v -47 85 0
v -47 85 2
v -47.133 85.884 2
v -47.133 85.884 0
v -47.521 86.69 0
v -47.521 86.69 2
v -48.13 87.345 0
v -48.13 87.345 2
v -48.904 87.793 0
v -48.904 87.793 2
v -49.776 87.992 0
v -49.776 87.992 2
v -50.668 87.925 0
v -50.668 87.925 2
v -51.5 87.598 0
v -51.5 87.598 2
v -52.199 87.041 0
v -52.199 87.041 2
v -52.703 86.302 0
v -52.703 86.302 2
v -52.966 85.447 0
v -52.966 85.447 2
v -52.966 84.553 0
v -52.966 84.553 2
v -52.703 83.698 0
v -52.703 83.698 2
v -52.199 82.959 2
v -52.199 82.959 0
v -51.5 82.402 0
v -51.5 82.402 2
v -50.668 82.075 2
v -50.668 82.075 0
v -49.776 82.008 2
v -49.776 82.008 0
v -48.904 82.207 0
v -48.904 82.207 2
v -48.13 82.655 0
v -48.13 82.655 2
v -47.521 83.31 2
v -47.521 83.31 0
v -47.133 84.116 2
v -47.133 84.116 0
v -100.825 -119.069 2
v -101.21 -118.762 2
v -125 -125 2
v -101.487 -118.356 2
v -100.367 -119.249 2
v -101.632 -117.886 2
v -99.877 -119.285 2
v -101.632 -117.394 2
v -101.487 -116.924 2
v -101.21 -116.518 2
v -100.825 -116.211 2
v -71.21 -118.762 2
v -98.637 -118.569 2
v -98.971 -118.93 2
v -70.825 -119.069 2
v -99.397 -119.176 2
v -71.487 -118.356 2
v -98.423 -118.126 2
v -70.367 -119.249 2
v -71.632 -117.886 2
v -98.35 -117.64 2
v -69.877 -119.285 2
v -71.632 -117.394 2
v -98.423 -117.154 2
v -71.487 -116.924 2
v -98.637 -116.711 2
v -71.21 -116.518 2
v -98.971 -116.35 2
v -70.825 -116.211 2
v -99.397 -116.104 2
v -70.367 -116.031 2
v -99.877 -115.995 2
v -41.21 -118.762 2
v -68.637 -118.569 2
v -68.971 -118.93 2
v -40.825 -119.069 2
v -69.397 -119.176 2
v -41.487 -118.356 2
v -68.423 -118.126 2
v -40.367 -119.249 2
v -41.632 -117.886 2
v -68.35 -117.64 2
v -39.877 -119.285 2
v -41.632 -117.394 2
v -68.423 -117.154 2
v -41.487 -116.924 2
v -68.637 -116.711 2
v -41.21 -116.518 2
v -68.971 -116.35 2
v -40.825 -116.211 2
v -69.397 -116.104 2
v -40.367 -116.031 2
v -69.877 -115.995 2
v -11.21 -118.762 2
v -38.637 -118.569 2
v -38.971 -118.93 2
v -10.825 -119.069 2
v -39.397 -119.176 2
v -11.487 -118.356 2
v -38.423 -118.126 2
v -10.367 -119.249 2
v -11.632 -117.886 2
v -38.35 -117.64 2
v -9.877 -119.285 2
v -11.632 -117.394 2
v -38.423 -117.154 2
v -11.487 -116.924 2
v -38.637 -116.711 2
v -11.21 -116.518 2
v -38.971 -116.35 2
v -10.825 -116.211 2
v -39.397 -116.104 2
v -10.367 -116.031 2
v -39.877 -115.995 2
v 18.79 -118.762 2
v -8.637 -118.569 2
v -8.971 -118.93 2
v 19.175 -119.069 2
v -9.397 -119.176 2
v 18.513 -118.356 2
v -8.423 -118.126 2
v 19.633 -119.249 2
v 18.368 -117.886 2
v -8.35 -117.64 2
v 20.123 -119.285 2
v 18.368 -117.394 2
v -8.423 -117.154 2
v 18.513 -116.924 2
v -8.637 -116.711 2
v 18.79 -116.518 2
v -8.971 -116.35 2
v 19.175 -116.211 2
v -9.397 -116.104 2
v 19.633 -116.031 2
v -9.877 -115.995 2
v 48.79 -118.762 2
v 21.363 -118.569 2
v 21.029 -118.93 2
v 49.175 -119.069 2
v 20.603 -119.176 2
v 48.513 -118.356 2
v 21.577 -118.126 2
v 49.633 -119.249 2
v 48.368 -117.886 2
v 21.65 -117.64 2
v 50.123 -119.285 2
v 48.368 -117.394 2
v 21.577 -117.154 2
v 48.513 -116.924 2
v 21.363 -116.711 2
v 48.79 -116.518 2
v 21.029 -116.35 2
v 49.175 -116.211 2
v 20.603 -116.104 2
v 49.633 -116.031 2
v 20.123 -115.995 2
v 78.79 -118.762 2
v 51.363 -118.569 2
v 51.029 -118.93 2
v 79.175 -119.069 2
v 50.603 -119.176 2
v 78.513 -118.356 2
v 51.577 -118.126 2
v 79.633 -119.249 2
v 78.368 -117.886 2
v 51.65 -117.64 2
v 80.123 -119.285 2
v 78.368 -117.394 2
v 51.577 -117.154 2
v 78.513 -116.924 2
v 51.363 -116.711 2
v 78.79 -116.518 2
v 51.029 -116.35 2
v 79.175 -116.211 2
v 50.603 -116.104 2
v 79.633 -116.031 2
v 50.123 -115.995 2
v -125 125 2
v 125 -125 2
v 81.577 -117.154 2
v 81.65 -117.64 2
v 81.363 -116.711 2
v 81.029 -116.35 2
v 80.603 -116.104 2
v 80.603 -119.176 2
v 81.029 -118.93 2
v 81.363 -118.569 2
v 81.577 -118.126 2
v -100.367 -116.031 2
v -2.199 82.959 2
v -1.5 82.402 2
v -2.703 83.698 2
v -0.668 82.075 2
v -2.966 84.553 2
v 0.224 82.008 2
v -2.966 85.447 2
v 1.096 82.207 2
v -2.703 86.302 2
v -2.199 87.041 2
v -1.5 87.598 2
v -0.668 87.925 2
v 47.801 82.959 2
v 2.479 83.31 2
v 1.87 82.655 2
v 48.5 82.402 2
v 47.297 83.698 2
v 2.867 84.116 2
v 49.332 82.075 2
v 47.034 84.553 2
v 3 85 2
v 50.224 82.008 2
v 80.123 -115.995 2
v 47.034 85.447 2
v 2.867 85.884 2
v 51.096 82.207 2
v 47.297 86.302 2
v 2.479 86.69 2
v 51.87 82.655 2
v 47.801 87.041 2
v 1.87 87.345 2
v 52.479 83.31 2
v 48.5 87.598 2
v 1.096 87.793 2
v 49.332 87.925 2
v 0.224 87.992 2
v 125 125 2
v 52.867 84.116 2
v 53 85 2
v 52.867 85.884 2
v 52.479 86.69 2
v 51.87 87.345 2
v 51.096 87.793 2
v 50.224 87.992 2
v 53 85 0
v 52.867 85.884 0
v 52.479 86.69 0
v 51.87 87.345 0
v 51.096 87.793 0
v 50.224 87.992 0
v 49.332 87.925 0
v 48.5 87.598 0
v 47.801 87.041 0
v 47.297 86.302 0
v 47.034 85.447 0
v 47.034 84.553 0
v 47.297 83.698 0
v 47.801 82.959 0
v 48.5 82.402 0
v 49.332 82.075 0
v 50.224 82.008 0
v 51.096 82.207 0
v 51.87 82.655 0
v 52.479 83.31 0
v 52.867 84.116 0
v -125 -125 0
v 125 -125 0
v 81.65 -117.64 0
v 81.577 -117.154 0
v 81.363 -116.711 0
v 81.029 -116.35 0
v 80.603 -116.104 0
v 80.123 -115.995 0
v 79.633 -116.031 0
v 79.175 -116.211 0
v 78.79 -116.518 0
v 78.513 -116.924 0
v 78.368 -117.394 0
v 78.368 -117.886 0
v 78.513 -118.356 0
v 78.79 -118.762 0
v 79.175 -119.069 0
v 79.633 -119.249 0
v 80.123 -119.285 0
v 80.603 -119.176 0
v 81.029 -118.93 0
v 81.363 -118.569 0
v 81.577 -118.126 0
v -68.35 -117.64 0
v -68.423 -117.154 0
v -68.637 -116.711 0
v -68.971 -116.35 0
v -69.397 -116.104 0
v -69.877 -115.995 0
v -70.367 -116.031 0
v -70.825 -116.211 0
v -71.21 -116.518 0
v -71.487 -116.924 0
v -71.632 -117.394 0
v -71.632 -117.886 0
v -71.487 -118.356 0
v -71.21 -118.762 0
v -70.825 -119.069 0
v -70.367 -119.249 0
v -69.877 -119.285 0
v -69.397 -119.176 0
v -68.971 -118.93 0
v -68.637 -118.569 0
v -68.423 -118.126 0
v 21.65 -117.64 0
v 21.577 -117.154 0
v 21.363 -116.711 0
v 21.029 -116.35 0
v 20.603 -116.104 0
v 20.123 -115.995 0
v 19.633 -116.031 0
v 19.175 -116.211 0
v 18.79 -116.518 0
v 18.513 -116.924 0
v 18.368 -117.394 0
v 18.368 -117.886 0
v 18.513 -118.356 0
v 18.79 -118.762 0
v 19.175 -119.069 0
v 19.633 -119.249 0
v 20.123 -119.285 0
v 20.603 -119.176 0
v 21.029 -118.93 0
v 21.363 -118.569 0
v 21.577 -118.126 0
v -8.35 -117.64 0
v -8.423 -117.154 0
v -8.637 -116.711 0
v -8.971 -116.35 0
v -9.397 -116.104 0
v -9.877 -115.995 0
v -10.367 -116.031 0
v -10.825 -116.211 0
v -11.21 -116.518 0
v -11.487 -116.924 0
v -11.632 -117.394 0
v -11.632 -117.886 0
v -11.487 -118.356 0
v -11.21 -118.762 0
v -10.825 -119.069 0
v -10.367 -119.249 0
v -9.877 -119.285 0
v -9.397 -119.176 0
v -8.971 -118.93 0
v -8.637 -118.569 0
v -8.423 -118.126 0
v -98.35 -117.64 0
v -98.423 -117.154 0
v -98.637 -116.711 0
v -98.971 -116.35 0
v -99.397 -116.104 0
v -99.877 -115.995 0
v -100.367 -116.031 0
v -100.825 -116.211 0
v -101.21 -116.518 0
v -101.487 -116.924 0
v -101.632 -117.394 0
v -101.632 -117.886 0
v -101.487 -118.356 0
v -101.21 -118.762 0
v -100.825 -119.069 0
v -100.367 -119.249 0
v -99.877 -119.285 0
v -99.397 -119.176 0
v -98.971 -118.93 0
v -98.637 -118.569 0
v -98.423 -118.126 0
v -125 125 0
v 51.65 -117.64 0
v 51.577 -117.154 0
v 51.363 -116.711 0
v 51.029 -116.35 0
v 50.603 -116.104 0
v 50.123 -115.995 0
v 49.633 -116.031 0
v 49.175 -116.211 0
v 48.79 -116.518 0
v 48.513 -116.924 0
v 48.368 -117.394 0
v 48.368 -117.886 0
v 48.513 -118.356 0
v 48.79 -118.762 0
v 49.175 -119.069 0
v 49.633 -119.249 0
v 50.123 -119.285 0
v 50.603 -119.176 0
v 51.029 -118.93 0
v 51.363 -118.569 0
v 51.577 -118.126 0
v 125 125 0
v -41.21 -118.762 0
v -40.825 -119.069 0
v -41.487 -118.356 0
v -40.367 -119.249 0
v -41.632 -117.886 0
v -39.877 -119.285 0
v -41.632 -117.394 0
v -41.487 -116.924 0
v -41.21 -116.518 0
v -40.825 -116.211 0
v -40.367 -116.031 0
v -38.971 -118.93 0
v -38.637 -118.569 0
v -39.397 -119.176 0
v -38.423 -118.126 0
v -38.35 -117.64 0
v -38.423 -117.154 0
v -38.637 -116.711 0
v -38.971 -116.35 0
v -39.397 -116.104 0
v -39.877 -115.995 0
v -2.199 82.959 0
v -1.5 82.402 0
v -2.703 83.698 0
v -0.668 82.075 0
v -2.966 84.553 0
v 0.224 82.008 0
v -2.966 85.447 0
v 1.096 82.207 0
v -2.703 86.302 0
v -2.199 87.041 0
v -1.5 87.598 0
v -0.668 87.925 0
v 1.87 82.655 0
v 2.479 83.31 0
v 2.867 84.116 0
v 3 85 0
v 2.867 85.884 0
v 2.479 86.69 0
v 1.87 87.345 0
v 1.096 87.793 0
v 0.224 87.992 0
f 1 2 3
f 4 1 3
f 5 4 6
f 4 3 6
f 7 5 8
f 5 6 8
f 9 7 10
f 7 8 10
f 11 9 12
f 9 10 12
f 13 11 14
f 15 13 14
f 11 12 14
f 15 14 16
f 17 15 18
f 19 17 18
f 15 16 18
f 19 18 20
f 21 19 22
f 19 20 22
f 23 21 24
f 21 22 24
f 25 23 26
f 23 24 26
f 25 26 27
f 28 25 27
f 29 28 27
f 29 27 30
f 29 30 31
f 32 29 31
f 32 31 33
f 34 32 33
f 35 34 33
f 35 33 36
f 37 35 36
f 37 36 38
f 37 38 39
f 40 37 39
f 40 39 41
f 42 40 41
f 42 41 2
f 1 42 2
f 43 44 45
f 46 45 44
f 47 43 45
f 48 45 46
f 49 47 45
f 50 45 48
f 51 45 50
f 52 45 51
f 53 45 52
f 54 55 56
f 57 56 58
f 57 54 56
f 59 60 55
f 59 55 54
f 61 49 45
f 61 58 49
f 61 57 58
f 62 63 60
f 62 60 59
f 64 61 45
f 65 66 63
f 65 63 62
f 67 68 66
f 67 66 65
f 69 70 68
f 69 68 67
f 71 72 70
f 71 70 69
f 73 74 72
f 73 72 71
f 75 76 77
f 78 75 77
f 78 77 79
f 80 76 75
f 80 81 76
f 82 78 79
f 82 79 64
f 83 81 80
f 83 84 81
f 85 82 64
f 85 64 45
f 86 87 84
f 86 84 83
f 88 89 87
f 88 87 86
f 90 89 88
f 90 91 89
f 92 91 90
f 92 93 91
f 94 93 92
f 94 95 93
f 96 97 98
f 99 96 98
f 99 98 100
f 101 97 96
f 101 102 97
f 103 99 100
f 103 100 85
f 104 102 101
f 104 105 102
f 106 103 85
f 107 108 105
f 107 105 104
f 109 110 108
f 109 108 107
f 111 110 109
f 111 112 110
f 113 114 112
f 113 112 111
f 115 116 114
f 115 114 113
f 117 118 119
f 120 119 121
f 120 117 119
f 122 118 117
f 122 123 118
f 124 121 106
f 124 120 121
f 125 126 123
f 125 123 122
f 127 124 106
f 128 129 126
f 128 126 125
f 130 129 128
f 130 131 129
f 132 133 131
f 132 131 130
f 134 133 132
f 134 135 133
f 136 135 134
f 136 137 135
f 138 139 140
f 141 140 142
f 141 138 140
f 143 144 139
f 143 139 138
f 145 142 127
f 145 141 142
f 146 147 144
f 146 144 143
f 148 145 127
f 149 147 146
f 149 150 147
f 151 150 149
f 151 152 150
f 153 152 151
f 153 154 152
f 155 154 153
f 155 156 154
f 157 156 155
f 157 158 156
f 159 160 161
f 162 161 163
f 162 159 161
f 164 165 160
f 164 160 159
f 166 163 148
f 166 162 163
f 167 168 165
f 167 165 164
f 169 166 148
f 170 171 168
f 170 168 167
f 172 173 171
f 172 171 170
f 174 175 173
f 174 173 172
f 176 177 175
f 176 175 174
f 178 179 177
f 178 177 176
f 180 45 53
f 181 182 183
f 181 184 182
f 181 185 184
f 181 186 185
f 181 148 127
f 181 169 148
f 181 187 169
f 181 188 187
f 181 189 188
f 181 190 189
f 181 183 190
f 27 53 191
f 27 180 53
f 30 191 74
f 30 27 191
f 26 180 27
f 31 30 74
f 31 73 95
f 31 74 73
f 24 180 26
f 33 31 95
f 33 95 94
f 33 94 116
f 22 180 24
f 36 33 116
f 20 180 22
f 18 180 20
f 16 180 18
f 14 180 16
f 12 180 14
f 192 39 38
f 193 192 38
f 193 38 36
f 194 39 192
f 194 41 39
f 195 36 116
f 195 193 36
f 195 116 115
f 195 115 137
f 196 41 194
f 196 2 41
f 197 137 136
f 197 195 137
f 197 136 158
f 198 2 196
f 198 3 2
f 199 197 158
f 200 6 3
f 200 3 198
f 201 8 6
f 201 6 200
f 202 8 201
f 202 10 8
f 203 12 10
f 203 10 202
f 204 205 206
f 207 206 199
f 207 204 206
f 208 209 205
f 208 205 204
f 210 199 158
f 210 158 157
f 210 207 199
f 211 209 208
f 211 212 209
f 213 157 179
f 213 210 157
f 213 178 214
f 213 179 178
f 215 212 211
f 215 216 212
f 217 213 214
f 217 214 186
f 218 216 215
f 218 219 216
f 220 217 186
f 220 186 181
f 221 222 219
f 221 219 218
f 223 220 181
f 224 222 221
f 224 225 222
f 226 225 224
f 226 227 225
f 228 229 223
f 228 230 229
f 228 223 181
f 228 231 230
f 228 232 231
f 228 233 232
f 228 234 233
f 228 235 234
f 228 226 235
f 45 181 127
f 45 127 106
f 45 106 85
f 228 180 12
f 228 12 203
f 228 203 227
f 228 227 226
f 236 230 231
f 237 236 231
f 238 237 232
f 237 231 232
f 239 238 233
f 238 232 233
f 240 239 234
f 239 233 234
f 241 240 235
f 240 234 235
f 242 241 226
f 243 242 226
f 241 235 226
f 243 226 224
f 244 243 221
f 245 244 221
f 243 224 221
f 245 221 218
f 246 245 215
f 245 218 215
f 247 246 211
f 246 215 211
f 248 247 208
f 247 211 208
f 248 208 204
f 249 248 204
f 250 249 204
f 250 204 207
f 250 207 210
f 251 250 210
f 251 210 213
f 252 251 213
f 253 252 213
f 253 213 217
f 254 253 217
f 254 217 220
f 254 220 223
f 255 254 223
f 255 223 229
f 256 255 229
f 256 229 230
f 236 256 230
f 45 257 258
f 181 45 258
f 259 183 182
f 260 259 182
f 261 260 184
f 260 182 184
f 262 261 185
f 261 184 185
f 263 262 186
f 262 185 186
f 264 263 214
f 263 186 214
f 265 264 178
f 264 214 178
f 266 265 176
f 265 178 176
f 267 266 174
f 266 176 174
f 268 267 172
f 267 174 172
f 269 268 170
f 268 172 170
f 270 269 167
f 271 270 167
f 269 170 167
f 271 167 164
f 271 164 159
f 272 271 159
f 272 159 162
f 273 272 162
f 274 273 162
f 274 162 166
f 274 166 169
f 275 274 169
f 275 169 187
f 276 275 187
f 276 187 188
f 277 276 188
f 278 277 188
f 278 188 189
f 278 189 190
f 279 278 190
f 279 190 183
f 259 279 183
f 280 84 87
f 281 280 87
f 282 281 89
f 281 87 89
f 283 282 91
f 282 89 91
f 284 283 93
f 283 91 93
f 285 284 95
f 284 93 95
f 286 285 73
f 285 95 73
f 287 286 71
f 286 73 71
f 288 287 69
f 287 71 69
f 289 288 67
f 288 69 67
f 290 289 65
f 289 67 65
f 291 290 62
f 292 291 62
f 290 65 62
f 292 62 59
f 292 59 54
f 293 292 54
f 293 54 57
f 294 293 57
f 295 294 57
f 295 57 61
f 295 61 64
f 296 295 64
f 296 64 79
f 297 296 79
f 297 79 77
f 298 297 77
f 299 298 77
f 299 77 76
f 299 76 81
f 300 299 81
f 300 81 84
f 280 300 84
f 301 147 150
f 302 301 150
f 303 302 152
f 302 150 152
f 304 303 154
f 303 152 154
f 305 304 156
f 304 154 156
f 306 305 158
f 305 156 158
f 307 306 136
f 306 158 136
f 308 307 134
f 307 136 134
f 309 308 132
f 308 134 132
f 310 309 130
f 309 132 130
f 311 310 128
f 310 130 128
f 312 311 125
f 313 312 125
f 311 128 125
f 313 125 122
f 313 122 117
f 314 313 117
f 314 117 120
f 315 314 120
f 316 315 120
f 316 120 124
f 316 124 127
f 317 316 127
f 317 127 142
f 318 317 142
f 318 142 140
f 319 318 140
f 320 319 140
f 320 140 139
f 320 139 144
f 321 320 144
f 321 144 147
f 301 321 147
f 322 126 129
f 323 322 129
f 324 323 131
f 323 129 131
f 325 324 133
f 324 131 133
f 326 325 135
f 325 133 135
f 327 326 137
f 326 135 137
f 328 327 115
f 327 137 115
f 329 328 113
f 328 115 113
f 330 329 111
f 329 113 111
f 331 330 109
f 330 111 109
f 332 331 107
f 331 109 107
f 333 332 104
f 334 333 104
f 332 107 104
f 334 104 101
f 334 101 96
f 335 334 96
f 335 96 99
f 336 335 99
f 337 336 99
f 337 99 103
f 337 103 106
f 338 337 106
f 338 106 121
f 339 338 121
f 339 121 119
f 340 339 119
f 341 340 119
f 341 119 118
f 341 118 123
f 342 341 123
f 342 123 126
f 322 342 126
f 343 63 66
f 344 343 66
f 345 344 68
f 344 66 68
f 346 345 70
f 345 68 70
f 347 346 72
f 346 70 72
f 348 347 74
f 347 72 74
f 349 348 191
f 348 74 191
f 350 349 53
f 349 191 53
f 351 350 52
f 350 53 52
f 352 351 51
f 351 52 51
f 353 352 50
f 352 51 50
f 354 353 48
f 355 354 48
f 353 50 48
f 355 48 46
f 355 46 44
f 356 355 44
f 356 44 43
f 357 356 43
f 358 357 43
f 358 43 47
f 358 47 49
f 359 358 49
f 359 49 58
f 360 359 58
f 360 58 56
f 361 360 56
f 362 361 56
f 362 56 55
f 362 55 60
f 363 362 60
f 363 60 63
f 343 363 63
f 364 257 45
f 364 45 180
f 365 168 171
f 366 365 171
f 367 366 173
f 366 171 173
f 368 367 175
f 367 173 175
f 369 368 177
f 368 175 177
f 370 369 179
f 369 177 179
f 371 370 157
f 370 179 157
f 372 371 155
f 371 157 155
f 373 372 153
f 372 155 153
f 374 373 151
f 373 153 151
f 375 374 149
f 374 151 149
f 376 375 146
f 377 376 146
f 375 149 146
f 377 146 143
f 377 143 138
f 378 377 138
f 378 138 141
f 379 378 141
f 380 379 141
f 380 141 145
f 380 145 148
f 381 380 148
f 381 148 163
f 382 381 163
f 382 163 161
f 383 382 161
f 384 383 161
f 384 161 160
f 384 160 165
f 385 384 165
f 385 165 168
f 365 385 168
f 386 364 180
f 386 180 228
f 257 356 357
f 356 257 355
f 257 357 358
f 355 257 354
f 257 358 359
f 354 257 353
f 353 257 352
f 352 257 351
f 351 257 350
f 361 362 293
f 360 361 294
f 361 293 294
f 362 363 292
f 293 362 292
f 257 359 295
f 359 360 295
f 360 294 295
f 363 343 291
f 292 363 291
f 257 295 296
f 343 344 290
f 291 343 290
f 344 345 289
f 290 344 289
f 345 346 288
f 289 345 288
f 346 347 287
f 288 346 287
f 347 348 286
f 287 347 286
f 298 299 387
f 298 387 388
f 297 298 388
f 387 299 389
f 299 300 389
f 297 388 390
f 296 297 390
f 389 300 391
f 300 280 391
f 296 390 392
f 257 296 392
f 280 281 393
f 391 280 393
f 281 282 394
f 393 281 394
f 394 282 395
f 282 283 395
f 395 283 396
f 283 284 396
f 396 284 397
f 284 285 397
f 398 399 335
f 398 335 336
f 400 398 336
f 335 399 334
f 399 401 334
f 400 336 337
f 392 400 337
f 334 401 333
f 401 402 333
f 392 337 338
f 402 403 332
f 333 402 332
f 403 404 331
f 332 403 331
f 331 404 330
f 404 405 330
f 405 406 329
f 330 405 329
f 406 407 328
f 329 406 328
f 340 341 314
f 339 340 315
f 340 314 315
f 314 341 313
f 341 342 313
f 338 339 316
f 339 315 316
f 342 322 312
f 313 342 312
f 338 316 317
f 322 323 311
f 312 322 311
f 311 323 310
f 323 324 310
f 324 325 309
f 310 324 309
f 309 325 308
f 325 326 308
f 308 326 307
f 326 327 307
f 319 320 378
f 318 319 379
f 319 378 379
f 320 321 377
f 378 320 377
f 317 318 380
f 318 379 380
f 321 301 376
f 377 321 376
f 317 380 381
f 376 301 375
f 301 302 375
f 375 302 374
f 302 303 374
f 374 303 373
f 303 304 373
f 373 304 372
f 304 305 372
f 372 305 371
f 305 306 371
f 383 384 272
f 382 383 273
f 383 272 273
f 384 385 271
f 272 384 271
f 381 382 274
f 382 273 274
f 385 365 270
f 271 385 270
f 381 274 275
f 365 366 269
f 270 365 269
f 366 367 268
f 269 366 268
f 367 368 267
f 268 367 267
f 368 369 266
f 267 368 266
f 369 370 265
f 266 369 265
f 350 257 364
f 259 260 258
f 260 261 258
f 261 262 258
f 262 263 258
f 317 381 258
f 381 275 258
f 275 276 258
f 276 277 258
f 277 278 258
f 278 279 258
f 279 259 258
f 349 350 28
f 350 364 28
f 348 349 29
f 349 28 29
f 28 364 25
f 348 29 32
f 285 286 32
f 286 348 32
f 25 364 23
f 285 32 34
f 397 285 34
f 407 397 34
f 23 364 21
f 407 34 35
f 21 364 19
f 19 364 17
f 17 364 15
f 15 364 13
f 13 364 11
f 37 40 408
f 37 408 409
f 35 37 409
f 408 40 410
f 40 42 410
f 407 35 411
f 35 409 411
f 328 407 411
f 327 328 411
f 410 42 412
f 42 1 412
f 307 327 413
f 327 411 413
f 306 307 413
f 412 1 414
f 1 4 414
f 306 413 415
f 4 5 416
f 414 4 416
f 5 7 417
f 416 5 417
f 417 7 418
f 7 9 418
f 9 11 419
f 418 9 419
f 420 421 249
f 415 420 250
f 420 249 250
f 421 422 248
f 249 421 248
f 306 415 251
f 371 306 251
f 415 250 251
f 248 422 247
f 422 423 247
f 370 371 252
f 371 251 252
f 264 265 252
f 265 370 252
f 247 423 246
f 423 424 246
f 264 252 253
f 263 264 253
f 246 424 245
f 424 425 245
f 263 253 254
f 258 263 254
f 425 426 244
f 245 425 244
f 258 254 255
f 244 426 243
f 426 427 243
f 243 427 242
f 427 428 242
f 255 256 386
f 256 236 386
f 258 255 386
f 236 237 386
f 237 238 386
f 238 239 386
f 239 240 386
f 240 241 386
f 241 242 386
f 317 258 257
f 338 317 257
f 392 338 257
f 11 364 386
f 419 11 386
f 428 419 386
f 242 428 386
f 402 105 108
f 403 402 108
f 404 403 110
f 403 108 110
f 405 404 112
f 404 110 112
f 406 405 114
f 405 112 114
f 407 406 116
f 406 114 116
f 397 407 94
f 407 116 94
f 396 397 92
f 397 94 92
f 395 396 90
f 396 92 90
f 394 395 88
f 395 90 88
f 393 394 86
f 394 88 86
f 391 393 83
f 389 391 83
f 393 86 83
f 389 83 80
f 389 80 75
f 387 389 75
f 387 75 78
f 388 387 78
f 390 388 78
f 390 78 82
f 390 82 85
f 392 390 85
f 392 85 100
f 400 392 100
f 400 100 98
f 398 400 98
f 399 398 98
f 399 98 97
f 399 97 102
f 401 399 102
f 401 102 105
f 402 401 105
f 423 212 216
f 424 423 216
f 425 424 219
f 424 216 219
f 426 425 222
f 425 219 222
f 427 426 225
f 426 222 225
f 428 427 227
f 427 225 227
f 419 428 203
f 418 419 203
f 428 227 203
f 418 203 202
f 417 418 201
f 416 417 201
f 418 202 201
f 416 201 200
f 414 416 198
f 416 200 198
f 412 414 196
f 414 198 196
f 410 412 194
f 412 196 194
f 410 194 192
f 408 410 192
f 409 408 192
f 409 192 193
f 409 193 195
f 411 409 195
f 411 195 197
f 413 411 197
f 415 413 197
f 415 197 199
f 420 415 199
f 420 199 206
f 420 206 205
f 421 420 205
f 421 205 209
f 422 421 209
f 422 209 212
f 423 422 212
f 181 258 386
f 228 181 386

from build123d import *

# Parameters (mm, degrees)
SKIZZE1_W                       = 250
SKIZZE1_H                       = 250
AUFSATZ_LINEAR_AUSTRAGEN1_DEPTH = 2
SKIZZE2_R                       = 3
SCHNITT_LINEAR_AUSTRAGEN1_DEPTH = 3
M4_GEWINDEBOHRUNG1_D            = 3.3


with BuildPart() as part:
    # Skizze1 → Aufsatz-Linear austragen1 (new body)
    with BuildSketch(Plane.XY):
        Rectangle(SKIZZE1_W, SKIZZE1_H)
    extrude(amount=AUFSATZ_LINEAR_AUSTRAGEN1_DEPTH)

    # Skizze2 → Schnitt-Linear austragen1 (cut, through all)
    with BuildSketch(Plane.XY.offset(2)):
        with Locations((0, 85)):
            Circle(SKIZZE2_R)
        with Locations((-50, 85)):
            Circle(SKIZZE2_R)
        with Locations((50, 85)):
            Circle(SKIZZE2_R)
    extrude(amount=-SCHNITT_LINEAR_AUSTRAGEN1_DEPTH, mode=Mode.SUBTRACT)

    # M4 Gewindebohrung1 (through all)
    with Locations(Plane(origin=(0, 0, 0), x_dir=(-1, 0, 0), z_dir=(0, 0, -1))):
        with Locations((-80, -117.64), (-50, -117.64), (-20, -117.64), (10, -117.64), (40, -117.64), (70, -117.64), (100, -117.64)):
            Hole(M4_GEWINDEBOHRUNG1_D / 2)


solid = part.part
